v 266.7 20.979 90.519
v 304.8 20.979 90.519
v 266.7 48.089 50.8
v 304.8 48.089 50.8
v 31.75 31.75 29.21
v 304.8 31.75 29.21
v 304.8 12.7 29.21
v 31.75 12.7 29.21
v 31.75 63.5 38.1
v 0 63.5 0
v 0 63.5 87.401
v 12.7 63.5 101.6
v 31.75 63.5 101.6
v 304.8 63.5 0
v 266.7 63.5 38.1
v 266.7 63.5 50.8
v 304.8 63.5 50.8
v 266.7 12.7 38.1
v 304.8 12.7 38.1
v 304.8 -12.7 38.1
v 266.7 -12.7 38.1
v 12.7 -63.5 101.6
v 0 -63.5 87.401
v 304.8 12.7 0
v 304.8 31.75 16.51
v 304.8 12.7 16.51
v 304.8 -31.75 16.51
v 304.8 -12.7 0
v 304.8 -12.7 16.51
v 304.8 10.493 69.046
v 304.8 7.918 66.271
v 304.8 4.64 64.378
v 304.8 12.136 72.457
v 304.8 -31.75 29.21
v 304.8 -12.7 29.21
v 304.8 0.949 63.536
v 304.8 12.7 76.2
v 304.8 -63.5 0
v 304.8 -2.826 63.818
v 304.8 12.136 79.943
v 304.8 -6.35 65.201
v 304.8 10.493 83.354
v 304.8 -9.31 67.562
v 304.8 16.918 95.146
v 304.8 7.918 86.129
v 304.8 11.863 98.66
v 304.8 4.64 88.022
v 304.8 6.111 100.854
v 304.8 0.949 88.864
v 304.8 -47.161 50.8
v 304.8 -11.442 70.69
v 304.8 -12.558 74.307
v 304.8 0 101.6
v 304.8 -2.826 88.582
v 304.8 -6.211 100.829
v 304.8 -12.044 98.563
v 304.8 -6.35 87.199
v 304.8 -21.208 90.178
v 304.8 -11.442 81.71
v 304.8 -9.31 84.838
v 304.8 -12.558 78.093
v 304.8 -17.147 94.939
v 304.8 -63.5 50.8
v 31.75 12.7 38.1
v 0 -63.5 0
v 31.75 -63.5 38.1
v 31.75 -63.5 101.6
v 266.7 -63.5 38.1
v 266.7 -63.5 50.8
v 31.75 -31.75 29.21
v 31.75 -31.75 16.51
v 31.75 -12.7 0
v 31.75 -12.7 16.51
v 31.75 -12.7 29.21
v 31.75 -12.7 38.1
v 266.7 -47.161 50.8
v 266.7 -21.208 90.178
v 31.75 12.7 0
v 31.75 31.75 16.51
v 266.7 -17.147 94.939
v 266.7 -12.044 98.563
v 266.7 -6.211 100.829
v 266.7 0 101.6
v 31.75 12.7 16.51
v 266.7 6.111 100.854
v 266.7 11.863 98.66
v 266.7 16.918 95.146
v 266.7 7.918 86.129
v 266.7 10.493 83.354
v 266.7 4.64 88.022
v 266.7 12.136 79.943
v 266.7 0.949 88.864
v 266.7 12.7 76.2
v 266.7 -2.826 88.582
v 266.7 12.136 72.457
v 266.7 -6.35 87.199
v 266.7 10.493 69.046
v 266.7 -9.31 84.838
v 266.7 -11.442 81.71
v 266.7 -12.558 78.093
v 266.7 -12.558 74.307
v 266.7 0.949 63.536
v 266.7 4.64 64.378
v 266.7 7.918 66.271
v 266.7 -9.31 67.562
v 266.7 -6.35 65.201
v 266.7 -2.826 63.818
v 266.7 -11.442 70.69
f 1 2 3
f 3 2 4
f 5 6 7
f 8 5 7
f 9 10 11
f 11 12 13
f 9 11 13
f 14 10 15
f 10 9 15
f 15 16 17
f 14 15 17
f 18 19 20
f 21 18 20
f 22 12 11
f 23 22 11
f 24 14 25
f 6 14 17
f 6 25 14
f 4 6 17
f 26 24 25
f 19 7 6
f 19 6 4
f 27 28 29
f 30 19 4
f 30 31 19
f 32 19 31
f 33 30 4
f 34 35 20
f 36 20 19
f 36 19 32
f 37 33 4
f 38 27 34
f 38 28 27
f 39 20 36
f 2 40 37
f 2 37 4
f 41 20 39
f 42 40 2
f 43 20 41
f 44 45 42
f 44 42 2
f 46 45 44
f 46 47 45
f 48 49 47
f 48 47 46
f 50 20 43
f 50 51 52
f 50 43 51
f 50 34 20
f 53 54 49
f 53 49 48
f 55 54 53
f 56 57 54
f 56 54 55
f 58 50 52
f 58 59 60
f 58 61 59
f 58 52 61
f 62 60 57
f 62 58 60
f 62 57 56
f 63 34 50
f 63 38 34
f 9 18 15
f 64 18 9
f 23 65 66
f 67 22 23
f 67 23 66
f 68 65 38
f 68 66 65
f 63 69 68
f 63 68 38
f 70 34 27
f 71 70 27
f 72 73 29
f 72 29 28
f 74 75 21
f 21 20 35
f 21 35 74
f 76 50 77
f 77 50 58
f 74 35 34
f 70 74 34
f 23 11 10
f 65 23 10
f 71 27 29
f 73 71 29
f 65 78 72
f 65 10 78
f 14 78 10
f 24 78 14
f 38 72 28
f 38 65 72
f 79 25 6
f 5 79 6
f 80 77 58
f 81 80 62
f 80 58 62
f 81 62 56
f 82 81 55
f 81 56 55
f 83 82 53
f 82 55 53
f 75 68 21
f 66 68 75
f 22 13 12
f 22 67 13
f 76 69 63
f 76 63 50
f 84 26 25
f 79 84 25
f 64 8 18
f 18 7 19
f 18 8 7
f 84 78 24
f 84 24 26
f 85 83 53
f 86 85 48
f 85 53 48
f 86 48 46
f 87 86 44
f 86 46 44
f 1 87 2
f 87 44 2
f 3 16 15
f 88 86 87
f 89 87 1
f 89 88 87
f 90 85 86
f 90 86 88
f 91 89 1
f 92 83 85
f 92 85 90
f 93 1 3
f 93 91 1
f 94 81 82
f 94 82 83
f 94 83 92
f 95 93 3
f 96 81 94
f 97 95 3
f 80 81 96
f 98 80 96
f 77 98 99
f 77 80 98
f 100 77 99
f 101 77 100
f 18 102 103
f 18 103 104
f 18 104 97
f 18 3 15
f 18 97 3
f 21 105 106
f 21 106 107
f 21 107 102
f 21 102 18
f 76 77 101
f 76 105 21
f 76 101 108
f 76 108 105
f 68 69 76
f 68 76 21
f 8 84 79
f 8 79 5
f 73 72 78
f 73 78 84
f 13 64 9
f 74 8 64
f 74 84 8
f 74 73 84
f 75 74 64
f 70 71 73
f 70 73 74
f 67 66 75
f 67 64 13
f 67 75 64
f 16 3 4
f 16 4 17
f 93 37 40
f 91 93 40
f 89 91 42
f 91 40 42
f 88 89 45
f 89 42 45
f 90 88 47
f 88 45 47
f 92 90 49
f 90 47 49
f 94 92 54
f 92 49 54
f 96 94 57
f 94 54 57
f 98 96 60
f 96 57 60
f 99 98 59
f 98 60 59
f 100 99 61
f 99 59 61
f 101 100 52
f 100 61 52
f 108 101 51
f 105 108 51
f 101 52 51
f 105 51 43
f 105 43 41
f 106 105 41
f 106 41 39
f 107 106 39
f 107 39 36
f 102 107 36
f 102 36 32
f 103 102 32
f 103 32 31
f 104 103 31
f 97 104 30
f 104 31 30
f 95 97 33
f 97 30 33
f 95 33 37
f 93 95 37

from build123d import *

# Parameters (mm, degrees)
F1_DEPTH = 63.5
F3_DEPTH = 38.1
F2_R     = 12.7
F4_DEPTH = 38.1
F5_DEPTH = 273.05


with BuildPart() as f1:
    # F0 (on Front) → F1 (new body, symmetric)
    with BuildSketch(Plane.XZ):
        Polygon((0, 87.400968), (0, 0), (304.8, 0), (304.8, 101.6), (266.7, 101.6), (266.7, 38.1), (31.75, 38.1), (31.75, 101.6), (12.7, 101.6), align=None)
    extrude(amount=F1_DEPTH, both=True)

    # F2 (on face) → F3 (cut)
    with BuildSketch(Plane.YZ.offset(304.8)):
        with BuildLine():
            Line((-63.5, 101.6), (-63.5, 50.8))
            Line((-63.5, 50.8), (-47.160853, 50.8))
            Line((-47.160853, 50.8), (-21.208122, 90.177681))
            ThreePointArc((-21.208122, 90.177681), (-12.044229, 98.562839), (0, 101.6))
            Line((0, 101.6), (-63.5, 101.6))
        make_face()
        with BuildLine():
            Line((63.5, 101.6), (0, 101.6))
            ThreePointArc((0, 101.6), (11.862834, 98.65959), (20.979086, 90.519147))
            Line((20.979086, 90.519147), (48.089147, 50.8))
            Line((48.089147, 50.8), (63.5, 50.8))
            Line((63.5, 50.8), (63.5, 101.6))
        make_face()
    extrude(amount=-F3_DEPTH, mode=Mode.SUBTRACT)

    # F2 (on face) → F4 (cut)
    with BuildSketch(Plane.YZ.offset(304.8)):
        with Locations((0, 76.2)):
            Circle(F2_R)
    extrude(amount=-F4_DEPTH, mode=Mode.SUBTRACT)

    # F2 (on face) → F5 (cut)
    with BuildSketch(Plane.YZ.offset(304.8)):
        Polygon((-12.7, 16.51), (-12.7, 0), (12.7, 0), (12.7, 16.51), (31.75, 16.51), (31.75, 29.21), (12.7, 29.21), (12.7, 38.1), (-12.7, 38.1), (-12.7, 29.21), (-31.75, 29.21), (-31.75, 16.51), align=None)
    extrude(amount=-F5_DEPTH, mode=Mode.SUBTRACT)


solid = f1.part
